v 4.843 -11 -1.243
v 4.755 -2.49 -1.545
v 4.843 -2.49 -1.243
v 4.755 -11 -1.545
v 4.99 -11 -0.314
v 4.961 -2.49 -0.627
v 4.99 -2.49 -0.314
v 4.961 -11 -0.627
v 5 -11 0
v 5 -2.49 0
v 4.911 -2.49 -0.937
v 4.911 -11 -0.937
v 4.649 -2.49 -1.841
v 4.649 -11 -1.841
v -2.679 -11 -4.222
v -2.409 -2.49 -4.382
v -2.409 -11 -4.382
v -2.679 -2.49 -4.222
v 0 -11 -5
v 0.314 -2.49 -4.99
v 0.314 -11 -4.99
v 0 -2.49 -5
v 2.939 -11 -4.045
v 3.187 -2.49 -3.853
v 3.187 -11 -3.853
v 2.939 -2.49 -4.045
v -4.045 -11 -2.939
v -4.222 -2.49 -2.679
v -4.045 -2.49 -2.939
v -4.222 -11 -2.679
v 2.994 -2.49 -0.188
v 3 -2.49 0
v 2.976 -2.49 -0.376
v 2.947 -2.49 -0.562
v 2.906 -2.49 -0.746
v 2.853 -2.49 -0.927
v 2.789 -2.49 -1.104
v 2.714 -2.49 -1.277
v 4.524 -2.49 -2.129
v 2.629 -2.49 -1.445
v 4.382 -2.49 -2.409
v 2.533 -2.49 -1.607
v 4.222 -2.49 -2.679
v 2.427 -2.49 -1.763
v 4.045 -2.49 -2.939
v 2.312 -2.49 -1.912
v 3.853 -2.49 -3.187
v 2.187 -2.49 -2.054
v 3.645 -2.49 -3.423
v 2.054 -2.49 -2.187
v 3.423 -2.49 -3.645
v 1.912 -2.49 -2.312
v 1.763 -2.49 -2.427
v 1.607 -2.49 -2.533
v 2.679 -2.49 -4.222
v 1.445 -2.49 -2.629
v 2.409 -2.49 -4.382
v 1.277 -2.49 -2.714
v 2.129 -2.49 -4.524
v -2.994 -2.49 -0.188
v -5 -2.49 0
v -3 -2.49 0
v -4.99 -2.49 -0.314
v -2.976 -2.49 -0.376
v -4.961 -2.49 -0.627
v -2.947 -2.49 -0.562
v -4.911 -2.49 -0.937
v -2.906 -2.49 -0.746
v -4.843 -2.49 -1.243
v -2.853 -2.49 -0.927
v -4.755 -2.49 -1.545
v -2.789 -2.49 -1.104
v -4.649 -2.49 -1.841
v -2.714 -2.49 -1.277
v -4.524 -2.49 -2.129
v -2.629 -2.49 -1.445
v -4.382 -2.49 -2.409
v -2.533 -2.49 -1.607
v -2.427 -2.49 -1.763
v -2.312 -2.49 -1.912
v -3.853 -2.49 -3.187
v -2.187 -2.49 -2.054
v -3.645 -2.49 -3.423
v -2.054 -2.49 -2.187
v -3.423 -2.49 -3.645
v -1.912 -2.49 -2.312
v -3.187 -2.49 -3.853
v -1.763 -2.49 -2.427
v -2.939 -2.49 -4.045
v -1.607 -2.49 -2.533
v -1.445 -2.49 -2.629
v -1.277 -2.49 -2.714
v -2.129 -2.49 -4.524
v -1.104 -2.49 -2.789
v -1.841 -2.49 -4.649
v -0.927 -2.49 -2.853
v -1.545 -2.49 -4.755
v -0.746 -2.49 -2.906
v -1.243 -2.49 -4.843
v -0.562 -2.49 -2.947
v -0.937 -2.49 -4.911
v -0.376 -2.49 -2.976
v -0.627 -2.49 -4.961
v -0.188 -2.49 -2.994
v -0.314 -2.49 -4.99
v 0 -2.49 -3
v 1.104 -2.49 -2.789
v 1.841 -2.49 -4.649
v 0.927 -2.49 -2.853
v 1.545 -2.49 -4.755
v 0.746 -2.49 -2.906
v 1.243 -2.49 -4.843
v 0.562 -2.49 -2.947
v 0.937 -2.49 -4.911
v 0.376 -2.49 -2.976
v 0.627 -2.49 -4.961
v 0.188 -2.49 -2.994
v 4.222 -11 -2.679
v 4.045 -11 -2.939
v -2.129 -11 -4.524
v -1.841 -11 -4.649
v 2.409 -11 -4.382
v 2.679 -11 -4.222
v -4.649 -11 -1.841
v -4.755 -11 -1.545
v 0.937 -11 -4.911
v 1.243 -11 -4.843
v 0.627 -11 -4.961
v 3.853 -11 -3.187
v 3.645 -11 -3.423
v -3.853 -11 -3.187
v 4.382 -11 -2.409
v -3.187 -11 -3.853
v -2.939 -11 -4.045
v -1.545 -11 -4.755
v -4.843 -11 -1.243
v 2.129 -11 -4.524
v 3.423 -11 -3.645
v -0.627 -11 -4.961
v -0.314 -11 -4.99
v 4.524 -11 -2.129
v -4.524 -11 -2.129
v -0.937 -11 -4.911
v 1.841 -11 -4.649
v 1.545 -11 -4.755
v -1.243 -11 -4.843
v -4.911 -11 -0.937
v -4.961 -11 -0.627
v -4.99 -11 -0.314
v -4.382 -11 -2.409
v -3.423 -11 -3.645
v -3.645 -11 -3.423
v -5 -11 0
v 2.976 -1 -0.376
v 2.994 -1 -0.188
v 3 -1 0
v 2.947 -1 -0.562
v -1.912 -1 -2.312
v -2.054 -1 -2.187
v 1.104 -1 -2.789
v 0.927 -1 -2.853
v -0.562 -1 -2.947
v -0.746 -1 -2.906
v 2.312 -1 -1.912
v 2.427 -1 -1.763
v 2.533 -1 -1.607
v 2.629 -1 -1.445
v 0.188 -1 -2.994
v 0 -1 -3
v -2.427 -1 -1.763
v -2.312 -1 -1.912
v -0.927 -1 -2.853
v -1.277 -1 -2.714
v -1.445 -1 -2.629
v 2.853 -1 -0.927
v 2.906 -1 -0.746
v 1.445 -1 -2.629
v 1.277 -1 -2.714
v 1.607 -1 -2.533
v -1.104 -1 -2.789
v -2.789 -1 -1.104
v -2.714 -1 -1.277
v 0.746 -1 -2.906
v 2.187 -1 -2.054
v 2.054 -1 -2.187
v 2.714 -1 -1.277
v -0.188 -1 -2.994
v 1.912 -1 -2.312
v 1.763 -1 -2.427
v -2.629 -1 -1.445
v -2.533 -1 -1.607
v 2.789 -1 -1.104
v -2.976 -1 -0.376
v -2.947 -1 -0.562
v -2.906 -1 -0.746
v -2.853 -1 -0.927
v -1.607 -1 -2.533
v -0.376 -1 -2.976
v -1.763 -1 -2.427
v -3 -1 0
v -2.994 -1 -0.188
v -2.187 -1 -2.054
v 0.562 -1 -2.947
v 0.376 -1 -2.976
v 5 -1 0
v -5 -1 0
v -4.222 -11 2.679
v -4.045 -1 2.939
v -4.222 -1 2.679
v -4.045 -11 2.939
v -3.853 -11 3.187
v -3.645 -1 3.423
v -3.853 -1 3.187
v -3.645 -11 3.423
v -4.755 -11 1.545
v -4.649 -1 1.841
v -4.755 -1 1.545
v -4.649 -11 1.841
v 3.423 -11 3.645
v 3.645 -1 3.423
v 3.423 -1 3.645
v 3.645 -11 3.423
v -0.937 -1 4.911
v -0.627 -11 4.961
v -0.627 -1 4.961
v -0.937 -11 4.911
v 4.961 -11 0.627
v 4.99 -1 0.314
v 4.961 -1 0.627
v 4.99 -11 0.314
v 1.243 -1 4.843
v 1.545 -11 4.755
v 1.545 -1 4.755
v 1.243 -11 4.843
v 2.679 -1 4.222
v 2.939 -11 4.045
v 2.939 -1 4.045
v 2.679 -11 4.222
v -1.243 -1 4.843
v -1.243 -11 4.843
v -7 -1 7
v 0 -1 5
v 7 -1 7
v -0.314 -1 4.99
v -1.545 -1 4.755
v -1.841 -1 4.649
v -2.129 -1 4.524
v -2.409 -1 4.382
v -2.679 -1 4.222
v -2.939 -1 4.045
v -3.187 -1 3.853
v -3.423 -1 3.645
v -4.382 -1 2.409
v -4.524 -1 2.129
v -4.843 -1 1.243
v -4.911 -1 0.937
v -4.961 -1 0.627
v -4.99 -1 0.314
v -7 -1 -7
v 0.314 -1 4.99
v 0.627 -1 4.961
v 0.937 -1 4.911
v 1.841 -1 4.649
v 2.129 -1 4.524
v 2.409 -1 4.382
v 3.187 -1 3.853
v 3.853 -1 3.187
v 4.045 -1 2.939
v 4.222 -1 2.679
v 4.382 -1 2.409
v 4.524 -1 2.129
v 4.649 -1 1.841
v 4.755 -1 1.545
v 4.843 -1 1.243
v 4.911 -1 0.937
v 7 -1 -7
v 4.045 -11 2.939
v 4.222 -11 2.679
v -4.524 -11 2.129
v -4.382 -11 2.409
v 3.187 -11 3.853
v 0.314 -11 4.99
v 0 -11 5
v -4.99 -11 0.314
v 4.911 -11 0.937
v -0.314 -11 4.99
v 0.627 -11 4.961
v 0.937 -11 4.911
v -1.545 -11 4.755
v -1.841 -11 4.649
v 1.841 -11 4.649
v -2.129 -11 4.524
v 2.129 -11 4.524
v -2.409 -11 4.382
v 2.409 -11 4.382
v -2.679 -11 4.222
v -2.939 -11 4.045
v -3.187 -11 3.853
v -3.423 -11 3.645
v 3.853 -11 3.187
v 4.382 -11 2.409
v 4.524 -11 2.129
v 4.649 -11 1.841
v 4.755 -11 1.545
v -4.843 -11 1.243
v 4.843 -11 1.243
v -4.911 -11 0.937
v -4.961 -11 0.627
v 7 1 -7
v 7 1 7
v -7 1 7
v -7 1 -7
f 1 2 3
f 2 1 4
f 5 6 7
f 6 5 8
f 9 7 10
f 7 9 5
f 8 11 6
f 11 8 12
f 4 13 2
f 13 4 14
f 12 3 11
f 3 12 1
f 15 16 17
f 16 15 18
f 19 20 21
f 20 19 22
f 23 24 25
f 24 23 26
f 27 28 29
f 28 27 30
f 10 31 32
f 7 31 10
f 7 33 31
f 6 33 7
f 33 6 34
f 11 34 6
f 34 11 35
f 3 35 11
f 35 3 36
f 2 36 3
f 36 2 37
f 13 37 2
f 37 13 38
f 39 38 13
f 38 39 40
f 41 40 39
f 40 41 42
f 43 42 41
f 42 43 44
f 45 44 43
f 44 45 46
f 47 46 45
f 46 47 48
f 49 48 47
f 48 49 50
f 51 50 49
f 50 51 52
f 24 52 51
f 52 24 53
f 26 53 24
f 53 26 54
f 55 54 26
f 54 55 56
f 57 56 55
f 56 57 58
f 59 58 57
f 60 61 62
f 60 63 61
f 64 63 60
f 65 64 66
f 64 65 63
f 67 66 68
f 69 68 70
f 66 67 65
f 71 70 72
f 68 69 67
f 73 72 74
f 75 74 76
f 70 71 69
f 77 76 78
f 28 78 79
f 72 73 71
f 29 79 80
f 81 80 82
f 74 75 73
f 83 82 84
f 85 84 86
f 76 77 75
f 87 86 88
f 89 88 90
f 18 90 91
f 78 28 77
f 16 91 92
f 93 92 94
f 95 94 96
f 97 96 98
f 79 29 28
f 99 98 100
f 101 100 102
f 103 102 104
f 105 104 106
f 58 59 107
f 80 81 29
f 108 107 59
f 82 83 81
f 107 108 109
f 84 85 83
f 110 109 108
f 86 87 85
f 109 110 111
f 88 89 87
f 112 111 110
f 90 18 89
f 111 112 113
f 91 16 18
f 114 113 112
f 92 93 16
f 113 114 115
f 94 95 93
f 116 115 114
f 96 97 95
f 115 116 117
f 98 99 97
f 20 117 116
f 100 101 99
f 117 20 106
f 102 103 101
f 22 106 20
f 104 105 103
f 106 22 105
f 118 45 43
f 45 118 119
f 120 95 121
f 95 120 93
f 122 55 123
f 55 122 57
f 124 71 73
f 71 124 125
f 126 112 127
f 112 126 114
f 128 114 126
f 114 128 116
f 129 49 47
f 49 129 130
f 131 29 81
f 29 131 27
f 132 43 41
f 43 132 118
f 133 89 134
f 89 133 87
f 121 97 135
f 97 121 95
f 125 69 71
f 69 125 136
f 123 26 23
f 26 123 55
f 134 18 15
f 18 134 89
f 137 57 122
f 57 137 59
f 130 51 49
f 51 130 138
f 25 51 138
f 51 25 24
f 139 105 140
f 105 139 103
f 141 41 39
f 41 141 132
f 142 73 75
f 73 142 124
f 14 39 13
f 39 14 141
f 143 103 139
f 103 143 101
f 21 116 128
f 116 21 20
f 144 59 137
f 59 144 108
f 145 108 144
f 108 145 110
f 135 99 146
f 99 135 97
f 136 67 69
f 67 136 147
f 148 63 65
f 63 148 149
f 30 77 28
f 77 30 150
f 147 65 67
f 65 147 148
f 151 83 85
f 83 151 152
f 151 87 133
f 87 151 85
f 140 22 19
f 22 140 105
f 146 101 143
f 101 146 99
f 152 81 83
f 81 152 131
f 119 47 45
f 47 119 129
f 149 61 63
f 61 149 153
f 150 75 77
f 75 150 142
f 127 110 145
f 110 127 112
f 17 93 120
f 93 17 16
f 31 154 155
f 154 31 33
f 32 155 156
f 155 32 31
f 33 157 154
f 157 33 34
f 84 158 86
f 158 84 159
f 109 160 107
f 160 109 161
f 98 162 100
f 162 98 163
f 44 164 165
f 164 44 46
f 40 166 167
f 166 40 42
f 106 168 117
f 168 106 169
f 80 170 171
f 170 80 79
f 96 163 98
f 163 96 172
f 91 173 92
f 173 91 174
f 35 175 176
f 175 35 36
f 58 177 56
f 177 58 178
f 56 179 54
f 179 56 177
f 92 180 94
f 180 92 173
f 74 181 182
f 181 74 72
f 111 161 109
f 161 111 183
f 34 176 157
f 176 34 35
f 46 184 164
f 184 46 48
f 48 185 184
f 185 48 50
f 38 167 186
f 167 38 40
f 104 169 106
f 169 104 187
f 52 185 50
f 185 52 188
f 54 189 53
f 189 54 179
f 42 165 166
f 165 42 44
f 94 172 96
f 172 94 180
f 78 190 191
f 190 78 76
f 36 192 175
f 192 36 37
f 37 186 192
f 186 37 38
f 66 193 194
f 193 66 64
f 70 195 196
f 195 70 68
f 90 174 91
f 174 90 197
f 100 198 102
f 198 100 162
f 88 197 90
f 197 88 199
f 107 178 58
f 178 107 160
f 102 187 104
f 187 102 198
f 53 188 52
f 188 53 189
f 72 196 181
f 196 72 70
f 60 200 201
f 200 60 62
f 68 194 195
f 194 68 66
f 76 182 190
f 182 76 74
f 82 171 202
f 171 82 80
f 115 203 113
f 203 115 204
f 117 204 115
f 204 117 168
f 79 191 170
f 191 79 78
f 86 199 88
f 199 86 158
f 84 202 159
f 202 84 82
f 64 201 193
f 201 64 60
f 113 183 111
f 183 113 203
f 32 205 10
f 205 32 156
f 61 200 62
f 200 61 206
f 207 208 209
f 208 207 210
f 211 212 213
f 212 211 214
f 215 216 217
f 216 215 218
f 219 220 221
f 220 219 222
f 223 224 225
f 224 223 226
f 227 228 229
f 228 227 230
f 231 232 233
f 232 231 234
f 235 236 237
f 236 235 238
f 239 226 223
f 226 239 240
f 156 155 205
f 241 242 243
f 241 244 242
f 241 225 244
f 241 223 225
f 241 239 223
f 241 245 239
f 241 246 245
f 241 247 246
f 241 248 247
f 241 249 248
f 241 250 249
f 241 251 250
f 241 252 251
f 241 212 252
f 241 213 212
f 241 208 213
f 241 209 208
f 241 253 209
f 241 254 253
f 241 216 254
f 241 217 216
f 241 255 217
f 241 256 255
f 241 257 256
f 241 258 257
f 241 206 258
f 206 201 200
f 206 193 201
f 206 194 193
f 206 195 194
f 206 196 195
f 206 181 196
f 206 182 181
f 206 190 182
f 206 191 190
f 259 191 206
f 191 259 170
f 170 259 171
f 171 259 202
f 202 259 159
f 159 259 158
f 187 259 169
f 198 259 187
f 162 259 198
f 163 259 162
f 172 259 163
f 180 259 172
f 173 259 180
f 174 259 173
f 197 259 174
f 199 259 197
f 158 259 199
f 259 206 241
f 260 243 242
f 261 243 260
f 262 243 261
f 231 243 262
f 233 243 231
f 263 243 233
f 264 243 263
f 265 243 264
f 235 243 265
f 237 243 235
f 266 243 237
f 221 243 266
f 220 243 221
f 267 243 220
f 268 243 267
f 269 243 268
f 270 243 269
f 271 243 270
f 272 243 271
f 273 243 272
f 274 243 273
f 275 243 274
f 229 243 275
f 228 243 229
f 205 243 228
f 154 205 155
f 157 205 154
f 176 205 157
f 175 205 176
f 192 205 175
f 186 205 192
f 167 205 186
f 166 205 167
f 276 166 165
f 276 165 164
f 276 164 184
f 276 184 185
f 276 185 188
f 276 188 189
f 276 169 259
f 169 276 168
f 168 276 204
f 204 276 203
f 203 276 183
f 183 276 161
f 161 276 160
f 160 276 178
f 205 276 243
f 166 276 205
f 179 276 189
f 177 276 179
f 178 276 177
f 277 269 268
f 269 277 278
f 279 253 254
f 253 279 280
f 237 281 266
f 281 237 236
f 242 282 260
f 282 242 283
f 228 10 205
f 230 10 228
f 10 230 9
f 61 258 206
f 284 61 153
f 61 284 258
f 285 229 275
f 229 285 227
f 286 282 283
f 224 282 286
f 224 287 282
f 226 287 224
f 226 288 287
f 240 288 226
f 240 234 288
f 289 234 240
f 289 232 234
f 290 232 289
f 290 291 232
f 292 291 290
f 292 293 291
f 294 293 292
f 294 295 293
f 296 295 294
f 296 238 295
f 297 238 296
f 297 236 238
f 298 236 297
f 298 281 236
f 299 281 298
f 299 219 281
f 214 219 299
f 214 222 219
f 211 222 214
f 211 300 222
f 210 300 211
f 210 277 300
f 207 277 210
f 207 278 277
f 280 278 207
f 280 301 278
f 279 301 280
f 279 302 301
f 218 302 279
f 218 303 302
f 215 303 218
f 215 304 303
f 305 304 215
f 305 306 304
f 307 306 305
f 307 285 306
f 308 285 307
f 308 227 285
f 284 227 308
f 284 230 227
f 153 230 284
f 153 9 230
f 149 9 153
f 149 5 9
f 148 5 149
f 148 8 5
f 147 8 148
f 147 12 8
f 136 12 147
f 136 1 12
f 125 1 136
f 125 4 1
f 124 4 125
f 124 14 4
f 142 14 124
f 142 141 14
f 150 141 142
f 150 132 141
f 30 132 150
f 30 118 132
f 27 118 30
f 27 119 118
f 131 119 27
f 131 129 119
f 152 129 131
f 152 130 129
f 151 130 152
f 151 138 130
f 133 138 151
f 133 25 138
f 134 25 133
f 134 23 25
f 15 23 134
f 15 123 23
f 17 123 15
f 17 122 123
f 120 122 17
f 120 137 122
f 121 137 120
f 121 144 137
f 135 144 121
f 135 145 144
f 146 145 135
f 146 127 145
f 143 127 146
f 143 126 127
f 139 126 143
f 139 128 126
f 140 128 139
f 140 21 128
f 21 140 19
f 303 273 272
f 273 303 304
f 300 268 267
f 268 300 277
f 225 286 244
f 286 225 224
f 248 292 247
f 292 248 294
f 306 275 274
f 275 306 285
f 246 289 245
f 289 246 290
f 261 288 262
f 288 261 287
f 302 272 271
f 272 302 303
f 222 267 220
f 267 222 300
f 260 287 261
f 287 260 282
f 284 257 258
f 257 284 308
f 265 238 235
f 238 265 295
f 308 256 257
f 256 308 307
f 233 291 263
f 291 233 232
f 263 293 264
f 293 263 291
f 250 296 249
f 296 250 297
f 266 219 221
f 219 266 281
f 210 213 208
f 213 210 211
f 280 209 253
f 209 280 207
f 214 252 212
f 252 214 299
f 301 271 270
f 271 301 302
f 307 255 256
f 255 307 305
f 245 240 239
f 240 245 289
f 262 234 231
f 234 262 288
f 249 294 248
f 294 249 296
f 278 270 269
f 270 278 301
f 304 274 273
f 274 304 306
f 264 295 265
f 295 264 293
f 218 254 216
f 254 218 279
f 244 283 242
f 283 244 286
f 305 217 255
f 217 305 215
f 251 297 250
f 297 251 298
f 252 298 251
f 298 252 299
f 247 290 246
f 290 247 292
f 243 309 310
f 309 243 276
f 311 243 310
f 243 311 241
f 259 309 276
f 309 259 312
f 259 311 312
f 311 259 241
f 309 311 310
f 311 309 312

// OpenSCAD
// The Width of the accessory base (in mm).
accessoryBaseWidth = 14; // [14:250]

// The Height of the accessory base (in mm).
accessoryBaseHeight = 14; // [14:220]

// Thickness of the accessory base (in mm).
accessoryBaseThickness = 2; // [0:5]

{}

accessoryBaseWithPins(accessoryBaseWidth, accessoryBaseHeight, accessoryBaseThickness);

// Module: accessoryBaseWithPins
// Generates a rectangular base with evenly spaced pins on its top surface.
// The pins are arranged in a grid pattern, and their number is calculated
// based on the dimensions of the base and the spacing between pins.
//
// Parameters:
// - baseWidth (number): The width of the base in the X direction.
// - baseHeight (number): The height of the base in the Y direction.
// - baseThickness (number): The thickness of the base in the Z direction.
module accessoryBaseWithPins(baseWidth, baseHeight, baseThickness) {
    $fn = 100;
    
    // Pin Parameters
    pinDiameter = pinDiameter();
    pinHeight = pinHeight();
    pinSpacingX = pinXSpacing();
    pinSpacingY = pinYSpacing();
    cutoutThickness = 1.5;

    // Calculate number of pins
    numPinsX = calculateColumnsOfPins(baseWidth);
    numPinsY = calculateRowsOfPins(baseHeight);

    // Total span of pins
    totalSpanX = (numPinsX - 1) * pinSpacingX;
    totalSpanY = (numPinsY - 1) * pinSpacingY;

    difference() {
        // Pins centered on top face
        rotate([90, 0, 0])
        for (i = [0 : numPinsX - 1])
            for (j = [0 : numPinsY - 1]) {
                xOffset = -totalSpanX / 2 + i * pinSpacingX;
                zOffset = -totalSpanY / 2 + j * pinSpacingY;
                translate([xOffset, zOffset, pinHeight / 2 + baseThickness / 2])
                    difference() {
                        rotate([0, 180, 180])
                        pin();
                    }
            }
    }

    // Base
    cube([baseWidth, baseThickness, baseHeight], center = true);
}

// Module: pin
// Creates a single pin with a cylindrical shape and a cutout on its top surface.
// The cutout is a washer-like structure with a half-cylinder removed.
//
// Parameters:
// - pinDiameter (number): The diameter of the pin.
// - pinHeight (number): The height of the pin.
// - cutoutThickness (number): The thickness of the washer-like cutout on the top of the pin.
module pin(pinDiameter = pinDiameter(), pinHeight = pinHeight(), cutoutThickness = pinCutoutThickness()) {
    $fn = 100;
    $innerD = 6;
    
    difference() {
        cylinder(h = pinHeight, r = pinDiameter / 2, center = true);

        translate([0, 0, pinHeight / 2 - cutoutThickness / 2 + 0.01])
        difference() {
            // Full washer
            cylinder(h = cutoutThickness, r = pinDiameter / 2, center = true);
                
            // Slightly taller to ensure clean subtraction
            cylinder(h = cutoutThickness, r = $innerD / 2, center = true);

            // Cut it in half
            translate([-pinDiameter / 2, -pinDiameter / 2, -cutoutThickness])
            cube([pinDiameter, pinDiameter / 2, cutoutThickness * 2]);
        }
    }
}

function pinDiameter() = 10;
function pinHeight() = 10;
function pinXSpacing() = 22;
function pinYSpacing() = 34;
function pinCutoutThickness() = 1.5;
function calculateRowsOfPins(distance) = max(1, ceil((distance-pinDiameter()) / pinYSpacing()));
function calculateColumnsOfPins(distance) = max(1, ceil((distance-pinDiameter()) / pinXSpacing()));
